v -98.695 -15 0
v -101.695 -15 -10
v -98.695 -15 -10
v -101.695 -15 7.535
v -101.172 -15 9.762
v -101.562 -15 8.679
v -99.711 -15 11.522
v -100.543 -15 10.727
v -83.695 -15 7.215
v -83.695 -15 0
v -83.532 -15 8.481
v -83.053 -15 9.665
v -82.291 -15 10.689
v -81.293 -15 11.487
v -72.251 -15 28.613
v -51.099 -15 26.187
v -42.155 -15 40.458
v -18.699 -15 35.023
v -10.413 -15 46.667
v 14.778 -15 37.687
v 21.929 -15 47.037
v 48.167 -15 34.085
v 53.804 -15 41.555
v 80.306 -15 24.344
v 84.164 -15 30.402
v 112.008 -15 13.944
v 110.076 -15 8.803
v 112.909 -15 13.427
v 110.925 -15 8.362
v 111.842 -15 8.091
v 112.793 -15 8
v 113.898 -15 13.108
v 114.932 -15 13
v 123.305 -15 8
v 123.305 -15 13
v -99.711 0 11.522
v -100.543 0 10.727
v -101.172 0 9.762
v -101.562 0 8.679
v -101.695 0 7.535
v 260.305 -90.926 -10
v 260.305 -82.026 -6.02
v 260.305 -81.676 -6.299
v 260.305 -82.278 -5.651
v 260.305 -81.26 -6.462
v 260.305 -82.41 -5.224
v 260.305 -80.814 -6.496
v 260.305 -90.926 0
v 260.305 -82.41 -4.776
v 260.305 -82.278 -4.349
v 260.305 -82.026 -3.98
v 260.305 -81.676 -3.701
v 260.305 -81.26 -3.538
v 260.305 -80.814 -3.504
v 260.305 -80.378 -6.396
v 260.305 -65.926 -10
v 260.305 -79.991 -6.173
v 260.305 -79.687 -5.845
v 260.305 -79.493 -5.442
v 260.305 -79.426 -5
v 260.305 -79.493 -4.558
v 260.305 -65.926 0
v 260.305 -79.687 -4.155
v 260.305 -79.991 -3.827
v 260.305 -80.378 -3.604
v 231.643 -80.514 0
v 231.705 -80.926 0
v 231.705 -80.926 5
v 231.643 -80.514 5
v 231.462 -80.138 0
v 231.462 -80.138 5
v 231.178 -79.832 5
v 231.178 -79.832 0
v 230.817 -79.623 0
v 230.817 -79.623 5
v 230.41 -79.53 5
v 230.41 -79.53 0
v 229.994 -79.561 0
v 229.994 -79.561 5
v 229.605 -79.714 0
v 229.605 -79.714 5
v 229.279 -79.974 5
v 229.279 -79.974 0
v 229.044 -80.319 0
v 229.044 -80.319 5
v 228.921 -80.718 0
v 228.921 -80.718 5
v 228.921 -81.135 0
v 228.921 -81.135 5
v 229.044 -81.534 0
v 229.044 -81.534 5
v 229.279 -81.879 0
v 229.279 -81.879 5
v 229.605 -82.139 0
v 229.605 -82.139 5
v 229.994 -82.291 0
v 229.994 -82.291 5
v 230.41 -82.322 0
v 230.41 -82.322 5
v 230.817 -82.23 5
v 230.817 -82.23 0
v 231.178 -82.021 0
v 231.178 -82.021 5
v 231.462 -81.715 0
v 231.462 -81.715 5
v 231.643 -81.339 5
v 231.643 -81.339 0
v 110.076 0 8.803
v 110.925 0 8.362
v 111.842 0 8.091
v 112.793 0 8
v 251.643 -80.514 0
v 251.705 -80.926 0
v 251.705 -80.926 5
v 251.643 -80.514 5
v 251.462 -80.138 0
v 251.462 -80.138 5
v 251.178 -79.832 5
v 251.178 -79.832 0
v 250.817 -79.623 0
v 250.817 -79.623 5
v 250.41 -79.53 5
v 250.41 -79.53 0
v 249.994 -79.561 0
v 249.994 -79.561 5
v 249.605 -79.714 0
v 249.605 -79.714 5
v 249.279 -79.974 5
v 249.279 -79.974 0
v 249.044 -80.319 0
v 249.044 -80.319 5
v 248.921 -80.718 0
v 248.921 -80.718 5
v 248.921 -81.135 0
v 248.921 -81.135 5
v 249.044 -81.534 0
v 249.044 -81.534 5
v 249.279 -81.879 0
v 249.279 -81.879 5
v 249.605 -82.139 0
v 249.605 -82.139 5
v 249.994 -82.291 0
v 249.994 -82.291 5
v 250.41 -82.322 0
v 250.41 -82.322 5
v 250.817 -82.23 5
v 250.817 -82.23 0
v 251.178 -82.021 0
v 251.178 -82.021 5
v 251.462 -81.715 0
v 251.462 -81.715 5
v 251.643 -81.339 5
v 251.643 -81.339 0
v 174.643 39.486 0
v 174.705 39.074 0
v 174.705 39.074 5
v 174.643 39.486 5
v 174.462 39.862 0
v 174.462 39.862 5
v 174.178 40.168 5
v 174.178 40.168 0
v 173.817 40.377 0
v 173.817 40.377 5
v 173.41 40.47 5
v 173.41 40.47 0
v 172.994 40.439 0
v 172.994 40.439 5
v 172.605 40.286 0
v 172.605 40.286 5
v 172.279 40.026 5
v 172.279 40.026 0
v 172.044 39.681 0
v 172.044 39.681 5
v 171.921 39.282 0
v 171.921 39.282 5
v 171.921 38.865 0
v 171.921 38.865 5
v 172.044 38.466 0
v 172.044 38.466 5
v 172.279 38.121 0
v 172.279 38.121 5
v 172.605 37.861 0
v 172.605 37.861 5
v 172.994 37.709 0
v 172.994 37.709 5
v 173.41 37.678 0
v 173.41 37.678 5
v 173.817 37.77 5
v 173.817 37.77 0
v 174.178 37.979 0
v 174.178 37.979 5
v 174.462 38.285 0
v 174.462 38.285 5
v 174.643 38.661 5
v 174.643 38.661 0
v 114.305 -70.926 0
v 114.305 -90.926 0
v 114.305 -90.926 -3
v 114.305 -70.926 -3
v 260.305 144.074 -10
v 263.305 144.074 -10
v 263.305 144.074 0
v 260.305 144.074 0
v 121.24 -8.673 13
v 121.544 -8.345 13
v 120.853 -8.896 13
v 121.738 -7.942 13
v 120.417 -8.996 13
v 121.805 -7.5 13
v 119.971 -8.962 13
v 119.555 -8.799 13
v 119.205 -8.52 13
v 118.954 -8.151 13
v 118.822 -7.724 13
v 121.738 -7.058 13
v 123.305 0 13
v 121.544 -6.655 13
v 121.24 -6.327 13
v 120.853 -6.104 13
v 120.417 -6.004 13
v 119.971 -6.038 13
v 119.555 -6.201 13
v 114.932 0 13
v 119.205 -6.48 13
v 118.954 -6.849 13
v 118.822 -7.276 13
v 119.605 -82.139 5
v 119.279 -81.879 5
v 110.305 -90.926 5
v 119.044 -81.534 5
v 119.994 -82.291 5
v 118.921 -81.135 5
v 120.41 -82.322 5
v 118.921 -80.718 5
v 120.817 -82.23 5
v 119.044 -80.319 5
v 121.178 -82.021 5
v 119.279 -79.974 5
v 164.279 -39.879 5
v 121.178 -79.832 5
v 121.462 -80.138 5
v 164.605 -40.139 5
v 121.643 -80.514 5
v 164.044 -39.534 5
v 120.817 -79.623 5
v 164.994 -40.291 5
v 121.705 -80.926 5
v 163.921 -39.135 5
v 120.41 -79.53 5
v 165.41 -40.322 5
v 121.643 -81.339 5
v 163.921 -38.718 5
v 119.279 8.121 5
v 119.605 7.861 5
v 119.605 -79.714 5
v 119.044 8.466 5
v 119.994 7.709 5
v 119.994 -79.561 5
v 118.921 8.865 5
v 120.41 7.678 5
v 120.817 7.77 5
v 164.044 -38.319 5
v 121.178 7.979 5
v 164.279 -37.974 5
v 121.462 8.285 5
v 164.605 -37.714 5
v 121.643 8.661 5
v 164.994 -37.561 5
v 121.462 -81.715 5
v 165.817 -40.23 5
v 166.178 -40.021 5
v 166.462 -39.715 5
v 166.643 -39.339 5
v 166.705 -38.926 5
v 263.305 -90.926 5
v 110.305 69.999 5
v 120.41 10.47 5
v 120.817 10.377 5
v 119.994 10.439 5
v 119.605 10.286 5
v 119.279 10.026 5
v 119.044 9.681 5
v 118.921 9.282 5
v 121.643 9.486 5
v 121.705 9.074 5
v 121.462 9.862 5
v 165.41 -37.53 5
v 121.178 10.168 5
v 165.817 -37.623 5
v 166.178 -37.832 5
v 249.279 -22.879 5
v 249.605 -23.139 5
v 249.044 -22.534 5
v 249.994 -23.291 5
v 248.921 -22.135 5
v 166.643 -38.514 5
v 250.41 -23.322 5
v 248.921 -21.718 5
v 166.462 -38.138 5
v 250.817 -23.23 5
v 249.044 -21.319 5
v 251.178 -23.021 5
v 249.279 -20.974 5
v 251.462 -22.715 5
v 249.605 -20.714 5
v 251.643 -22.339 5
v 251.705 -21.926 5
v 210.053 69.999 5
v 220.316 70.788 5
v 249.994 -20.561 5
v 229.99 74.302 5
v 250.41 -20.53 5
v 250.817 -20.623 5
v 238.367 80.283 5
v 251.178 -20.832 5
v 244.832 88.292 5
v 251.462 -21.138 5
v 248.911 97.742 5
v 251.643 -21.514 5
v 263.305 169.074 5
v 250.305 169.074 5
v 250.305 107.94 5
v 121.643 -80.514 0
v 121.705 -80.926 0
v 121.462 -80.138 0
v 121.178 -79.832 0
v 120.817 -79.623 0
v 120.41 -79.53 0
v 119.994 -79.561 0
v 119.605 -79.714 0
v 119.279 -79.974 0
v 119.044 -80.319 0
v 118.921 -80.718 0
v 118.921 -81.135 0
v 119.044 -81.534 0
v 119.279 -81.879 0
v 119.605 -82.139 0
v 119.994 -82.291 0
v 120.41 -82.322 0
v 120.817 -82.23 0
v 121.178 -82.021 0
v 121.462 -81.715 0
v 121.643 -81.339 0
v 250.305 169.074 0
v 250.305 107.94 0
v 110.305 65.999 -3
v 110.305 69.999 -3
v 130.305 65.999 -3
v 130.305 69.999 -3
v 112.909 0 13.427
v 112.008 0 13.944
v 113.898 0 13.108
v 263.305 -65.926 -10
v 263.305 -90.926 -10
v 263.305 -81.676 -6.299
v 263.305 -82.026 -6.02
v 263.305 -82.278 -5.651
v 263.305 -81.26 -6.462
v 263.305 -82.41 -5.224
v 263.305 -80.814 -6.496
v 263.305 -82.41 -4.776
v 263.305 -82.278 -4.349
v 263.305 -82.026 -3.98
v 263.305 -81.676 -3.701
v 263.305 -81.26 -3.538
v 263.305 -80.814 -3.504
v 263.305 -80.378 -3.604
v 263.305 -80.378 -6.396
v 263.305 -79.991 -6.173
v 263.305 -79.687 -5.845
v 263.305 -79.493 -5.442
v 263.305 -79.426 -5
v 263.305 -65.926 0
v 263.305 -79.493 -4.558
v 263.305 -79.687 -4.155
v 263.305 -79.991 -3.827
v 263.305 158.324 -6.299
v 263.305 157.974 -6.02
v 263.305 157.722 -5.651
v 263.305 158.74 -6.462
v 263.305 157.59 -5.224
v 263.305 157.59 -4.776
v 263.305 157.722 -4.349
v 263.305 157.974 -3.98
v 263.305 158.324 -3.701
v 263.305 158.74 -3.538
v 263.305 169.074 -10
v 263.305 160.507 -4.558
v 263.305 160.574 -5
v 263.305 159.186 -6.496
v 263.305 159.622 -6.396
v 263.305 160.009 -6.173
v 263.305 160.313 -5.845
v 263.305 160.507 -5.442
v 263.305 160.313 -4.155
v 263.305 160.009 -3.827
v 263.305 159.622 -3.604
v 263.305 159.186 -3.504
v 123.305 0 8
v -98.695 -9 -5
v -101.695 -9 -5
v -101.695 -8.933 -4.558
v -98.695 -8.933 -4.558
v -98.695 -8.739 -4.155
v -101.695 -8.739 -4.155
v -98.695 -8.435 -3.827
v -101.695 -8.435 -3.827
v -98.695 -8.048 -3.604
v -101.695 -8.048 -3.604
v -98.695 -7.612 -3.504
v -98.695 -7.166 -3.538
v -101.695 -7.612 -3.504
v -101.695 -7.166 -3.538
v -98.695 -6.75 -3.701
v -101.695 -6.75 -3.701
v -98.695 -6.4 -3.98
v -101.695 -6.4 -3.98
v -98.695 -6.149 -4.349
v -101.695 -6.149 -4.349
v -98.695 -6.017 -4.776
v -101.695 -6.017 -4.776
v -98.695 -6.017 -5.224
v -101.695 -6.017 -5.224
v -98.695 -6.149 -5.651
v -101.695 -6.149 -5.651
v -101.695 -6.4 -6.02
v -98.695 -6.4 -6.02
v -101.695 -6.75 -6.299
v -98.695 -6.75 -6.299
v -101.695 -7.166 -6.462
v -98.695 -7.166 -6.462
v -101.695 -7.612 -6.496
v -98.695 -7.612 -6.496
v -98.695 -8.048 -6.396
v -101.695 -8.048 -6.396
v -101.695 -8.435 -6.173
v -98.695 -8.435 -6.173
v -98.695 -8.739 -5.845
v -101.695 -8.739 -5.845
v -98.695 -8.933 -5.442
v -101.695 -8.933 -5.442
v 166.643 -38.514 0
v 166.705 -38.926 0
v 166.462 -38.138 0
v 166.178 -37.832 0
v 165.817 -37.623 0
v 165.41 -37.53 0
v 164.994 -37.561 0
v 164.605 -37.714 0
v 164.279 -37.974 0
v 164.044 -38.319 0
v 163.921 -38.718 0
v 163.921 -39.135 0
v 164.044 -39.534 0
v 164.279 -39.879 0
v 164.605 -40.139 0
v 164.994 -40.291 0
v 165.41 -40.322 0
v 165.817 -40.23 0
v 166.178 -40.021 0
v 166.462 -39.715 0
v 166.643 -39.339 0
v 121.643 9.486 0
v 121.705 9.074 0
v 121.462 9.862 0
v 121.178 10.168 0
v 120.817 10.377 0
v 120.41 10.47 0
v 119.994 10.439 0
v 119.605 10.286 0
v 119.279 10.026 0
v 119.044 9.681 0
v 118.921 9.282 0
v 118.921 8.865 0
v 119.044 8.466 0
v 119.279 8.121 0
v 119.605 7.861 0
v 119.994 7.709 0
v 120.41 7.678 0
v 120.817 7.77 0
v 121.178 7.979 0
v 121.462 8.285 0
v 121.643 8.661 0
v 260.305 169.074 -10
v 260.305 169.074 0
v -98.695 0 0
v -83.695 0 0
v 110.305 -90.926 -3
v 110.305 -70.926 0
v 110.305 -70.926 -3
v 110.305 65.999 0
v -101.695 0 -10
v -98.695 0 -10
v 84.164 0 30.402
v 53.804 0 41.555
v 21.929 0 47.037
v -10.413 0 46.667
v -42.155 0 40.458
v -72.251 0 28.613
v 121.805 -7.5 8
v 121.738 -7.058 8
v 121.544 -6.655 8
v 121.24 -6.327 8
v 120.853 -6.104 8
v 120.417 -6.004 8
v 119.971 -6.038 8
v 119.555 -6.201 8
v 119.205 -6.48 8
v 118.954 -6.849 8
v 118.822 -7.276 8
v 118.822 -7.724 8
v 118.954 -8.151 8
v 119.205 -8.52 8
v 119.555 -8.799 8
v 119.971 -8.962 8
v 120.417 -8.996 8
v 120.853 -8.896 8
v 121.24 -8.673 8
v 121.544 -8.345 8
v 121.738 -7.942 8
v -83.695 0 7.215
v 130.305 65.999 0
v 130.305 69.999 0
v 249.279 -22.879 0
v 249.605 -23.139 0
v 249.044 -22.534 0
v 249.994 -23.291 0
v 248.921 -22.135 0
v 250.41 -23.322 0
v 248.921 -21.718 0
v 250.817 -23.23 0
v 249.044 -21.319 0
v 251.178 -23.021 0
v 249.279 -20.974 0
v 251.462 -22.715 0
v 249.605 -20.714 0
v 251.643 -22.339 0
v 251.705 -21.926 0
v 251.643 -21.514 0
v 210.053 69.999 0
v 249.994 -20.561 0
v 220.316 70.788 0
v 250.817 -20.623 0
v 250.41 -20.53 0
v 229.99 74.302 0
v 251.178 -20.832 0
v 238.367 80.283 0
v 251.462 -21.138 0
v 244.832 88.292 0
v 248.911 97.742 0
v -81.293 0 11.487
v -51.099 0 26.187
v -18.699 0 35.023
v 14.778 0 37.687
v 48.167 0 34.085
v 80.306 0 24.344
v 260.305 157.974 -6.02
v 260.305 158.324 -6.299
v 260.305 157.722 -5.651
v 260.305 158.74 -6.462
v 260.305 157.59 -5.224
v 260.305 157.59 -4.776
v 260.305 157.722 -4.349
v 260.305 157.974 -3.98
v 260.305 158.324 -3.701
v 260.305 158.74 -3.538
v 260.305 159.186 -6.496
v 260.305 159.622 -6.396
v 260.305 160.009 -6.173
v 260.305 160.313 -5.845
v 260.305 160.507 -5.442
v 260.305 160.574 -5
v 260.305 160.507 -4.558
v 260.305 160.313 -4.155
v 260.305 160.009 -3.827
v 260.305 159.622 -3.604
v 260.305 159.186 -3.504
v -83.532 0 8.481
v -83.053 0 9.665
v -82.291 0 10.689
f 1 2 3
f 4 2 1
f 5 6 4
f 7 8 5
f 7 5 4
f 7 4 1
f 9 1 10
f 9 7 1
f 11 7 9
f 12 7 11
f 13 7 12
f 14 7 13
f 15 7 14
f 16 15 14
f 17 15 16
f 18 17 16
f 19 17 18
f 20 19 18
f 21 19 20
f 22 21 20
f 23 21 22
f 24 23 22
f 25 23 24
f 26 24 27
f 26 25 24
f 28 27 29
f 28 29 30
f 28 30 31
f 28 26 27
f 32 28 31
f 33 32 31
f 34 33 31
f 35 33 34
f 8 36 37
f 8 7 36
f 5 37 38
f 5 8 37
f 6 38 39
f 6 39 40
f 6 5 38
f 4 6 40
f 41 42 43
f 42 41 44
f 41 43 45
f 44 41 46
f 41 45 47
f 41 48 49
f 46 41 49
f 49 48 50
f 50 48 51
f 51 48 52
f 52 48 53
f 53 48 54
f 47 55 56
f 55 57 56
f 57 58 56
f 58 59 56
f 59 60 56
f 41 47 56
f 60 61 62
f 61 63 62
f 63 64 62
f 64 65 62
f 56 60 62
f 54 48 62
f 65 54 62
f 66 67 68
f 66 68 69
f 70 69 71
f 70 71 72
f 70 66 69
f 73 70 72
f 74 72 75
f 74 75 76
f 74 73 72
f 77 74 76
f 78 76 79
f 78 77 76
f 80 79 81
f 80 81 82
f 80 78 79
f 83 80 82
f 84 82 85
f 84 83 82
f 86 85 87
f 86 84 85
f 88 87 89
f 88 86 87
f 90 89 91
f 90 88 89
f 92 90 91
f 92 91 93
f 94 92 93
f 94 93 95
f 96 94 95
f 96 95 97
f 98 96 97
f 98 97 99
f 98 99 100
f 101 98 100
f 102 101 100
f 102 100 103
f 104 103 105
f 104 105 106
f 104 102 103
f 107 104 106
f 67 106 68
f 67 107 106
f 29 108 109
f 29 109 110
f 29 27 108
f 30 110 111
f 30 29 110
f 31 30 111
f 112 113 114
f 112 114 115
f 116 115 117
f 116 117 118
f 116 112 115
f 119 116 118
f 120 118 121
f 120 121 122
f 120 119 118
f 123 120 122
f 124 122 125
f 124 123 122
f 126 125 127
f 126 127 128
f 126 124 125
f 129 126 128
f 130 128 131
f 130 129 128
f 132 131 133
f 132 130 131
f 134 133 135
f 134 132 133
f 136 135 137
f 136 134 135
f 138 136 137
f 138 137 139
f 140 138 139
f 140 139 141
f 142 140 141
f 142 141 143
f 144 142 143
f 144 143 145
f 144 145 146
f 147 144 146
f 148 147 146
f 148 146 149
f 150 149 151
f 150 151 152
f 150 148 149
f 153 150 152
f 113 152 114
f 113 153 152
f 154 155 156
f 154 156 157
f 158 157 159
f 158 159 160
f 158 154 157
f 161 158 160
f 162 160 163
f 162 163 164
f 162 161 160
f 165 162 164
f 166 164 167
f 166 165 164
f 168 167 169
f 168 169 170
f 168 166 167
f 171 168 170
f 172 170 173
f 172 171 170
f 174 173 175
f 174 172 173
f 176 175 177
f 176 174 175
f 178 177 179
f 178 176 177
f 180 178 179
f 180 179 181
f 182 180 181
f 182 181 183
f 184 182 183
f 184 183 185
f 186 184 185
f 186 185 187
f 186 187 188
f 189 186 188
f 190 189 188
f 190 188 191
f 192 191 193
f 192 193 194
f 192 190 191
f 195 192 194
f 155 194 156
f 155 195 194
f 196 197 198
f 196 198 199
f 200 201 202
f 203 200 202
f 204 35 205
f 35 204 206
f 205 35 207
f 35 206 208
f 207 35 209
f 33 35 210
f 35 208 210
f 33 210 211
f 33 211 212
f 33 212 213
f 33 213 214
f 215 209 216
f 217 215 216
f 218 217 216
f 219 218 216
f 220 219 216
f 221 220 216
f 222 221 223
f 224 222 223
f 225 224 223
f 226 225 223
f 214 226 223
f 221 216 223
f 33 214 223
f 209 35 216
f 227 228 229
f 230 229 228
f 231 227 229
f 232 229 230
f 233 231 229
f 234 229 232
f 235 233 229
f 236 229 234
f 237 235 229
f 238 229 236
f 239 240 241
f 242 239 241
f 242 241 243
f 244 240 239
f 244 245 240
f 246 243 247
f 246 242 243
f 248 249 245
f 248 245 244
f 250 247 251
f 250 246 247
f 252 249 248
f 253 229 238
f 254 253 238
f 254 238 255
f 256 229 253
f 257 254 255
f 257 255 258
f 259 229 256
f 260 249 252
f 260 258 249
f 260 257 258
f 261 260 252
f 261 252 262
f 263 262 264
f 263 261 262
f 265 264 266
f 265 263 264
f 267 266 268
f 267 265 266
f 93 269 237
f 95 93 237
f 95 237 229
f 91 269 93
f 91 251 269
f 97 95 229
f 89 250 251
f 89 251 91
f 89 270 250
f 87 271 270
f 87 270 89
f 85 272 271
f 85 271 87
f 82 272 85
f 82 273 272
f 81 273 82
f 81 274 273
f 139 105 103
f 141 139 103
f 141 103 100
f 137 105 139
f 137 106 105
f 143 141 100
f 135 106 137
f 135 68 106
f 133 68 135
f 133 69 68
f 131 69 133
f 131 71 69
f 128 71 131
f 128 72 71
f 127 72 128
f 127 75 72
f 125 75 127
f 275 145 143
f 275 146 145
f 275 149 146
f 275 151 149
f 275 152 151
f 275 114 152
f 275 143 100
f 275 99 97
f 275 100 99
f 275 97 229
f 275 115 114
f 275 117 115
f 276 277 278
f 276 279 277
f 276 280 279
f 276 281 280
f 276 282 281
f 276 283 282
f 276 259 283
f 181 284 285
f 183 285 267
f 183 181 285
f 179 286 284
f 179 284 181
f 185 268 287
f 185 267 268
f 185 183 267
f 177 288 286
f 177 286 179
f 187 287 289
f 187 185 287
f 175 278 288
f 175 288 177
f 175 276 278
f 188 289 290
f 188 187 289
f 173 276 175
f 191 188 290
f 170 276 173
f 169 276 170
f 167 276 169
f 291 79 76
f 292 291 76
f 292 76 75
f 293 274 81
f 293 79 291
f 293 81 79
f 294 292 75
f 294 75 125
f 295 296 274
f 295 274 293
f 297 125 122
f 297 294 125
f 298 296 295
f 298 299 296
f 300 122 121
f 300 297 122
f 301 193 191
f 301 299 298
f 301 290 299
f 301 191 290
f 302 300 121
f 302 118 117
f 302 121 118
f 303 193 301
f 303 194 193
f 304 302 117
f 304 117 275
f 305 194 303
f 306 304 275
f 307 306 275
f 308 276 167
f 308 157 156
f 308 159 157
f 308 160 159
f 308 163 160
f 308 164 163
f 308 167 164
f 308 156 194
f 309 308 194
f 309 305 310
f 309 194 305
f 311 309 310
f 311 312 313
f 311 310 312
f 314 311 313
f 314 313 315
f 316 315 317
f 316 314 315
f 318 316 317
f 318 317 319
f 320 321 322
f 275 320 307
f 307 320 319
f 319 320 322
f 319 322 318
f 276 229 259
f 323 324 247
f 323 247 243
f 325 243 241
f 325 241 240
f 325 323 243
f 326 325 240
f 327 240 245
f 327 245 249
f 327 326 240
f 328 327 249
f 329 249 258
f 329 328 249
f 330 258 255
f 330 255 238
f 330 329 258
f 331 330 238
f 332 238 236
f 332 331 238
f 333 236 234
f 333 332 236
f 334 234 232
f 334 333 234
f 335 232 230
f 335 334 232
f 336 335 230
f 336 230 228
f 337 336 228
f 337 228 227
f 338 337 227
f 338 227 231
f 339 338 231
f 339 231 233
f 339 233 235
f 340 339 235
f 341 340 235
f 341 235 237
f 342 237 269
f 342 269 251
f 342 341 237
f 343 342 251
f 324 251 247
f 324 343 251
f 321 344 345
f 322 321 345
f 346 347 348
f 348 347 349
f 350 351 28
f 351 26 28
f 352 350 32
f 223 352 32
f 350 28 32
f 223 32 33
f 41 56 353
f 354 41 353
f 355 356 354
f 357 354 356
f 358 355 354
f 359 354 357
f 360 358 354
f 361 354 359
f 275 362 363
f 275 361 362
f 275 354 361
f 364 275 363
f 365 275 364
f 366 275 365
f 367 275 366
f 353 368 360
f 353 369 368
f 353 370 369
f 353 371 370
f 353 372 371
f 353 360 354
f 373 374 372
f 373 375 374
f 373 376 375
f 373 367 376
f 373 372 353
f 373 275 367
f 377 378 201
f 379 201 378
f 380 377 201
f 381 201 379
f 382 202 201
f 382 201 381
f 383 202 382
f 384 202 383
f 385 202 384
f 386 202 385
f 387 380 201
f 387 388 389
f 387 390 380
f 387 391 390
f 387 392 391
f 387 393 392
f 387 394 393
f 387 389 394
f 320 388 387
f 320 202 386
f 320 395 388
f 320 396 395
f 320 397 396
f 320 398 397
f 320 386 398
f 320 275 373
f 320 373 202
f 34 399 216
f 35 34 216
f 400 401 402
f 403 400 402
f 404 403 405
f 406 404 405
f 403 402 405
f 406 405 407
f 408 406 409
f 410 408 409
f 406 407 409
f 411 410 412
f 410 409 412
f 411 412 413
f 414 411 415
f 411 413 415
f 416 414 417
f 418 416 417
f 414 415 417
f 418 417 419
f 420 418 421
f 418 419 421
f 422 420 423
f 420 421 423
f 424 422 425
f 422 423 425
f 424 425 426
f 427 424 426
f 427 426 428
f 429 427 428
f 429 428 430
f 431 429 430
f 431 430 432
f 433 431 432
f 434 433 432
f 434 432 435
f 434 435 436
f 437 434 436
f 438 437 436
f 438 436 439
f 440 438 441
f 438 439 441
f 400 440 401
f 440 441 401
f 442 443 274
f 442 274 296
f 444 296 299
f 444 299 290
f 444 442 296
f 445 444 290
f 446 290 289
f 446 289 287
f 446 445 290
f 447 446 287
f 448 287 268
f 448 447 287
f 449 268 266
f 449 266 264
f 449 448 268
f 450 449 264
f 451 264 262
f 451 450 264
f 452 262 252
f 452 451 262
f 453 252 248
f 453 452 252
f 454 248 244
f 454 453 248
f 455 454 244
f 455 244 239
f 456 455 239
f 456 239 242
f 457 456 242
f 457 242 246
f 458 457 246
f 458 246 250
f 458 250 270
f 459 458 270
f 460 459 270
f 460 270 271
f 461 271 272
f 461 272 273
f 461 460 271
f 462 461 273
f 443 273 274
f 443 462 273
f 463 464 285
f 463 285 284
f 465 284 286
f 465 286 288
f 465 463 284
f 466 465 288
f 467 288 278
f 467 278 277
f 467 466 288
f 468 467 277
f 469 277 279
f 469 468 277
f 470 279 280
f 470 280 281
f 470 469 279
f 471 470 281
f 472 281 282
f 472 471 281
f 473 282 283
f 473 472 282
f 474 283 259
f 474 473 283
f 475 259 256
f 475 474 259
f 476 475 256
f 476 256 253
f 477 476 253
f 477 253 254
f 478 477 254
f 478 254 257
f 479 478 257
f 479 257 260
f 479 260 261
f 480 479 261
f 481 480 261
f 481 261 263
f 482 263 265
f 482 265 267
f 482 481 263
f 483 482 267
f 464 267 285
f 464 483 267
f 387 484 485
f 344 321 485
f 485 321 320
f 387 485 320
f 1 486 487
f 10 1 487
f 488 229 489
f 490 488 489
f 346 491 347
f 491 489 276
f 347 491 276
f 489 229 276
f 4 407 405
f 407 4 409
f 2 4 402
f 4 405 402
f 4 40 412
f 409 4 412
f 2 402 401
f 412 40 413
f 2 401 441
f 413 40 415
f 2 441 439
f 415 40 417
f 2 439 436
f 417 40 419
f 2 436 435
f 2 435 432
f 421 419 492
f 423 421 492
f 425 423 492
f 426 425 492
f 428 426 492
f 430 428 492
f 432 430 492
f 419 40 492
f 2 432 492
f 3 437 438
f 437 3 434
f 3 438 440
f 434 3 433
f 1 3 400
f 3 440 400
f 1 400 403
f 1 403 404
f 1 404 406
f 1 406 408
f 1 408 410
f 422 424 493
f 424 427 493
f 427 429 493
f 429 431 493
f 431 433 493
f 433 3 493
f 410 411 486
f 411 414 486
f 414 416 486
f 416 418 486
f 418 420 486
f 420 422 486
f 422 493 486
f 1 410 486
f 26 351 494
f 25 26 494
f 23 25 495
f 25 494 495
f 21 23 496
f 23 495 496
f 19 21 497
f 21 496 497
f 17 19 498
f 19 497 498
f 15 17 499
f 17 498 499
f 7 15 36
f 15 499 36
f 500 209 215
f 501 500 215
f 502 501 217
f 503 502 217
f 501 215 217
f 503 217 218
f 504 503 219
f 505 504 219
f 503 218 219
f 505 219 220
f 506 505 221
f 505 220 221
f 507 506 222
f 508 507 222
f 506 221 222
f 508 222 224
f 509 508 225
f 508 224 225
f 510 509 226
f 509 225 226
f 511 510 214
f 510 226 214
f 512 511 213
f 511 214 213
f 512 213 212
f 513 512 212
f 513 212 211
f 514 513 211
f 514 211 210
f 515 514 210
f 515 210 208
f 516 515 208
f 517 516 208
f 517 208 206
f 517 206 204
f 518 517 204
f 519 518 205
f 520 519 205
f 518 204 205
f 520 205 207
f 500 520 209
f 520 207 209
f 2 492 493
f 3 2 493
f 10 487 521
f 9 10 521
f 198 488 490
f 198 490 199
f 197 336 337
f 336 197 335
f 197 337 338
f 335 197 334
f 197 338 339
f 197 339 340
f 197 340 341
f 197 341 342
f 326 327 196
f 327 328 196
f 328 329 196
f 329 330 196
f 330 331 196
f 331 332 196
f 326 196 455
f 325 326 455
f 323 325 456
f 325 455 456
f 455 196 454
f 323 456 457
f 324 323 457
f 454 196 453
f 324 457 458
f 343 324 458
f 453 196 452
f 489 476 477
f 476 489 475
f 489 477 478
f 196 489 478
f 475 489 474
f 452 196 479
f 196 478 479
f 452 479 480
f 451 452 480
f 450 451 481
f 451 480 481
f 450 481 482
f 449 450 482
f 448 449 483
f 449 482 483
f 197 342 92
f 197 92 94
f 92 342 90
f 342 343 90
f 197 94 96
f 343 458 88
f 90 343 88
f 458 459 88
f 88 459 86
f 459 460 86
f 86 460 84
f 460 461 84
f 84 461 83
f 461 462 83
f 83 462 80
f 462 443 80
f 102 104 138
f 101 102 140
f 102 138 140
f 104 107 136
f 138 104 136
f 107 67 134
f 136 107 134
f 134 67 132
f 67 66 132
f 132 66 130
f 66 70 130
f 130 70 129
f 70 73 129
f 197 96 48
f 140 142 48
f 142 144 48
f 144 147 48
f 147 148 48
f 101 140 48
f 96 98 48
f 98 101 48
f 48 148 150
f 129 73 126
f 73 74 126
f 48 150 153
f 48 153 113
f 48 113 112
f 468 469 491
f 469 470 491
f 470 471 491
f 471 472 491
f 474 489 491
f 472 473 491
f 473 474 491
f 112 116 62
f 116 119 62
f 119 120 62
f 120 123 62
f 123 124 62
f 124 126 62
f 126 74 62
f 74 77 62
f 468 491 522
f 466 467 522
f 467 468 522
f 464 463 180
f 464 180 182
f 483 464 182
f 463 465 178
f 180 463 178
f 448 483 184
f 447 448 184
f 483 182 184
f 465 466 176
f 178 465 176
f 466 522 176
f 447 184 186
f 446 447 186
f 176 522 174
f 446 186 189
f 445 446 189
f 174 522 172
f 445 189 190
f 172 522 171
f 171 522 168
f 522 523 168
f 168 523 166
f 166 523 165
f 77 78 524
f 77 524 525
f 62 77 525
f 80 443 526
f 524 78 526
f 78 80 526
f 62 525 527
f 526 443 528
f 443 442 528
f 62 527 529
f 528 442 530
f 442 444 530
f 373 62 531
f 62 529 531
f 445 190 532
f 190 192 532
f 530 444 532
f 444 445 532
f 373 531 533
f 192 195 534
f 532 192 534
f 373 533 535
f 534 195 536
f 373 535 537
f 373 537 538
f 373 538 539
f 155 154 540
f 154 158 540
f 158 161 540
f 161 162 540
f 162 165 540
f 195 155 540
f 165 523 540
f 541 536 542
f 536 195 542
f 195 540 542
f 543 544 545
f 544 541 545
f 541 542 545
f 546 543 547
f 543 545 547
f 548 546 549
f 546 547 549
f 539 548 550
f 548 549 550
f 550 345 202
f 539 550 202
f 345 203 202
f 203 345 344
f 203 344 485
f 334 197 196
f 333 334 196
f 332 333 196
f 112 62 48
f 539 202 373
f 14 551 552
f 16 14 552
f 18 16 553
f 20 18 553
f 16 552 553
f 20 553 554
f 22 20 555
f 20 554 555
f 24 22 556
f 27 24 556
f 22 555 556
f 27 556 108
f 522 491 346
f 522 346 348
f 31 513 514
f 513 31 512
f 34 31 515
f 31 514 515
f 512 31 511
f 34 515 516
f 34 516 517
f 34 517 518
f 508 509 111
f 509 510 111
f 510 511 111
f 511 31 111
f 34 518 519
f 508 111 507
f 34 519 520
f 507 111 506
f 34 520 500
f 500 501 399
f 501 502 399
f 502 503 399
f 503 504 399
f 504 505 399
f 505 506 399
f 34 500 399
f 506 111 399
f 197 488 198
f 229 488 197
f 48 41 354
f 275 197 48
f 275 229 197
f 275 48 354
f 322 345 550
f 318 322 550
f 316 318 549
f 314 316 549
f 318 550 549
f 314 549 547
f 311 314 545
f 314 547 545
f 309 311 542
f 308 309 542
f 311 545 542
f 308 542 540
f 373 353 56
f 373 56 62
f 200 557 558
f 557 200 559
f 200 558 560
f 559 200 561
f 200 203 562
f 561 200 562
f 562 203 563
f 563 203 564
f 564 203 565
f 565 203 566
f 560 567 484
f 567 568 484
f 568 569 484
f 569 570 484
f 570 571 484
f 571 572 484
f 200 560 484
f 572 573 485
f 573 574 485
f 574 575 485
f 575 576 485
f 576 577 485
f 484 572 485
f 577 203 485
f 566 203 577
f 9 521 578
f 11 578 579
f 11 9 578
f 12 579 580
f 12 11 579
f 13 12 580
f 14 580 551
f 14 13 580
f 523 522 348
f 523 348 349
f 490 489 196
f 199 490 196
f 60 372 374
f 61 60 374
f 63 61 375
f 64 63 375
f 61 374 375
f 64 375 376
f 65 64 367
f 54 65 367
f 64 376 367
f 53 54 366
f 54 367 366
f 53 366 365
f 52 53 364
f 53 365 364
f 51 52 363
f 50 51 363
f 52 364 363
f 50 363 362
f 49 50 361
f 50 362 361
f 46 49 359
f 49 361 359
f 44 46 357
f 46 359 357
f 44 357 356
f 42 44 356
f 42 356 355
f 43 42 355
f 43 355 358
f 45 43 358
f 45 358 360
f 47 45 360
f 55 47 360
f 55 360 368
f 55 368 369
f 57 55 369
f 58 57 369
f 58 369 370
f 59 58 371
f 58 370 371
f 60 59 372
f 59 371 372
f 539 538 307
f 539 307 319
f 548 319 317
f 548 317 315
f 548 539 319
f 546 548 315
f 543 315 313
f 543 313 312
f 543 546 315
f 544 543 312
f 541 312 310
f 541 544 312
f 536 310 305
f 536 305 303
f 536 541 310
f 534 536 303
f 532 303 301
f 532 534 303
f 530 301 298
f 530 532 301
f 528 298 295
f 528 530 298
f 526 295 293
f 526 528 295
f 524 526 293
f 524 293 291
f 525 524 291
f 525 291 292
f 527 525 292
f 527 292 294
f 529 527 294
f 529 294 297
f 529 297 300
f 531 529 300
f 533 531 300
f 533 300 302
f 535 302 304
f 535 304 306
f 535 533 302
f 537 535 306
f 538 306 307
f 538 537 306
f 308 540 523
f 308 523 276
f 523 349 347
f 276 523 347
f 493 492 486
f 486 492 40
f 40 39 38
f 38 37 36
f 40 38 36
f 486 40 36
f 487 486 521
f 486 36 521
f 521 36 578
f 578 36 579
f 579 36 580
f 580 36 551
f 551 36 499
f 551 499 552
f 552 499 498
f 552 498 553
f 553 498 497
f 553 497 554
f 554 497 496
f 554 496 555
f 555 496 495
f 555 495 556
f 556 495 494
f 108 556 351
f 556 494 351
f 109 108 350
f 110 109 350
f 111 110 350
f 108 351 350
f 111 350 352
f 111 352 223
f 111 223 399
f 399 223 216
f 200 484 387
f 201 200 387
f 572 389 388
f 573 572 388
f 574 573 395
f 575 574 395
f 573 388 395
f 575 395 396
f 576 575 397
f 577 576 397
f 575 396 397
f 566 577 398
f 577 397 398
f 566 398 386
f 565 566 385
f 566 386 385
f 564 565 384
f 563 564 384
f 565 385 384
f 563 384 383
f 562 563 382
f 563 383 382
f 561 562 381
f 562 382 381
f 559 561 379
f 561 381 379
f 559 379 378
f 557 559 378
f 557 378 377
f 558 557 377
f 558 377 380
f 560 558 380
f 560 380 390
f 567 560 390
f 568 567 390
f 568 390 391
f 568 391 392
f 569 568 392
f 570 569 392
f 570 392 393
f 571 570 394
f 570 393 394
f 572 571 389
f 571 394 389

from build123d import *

# Parameters (mm, degrees)
F0_R      = 1.4
F1_DEPTH  = 5
F2_W      = 3
F2_H      = 260
F2_W_2    = 4
F2_H_2    = 20
F2_W_3    = 20
F2_H_3    = 4
F3_DEPTH  = 5
F4_DEPTH  = 10
F5_R      = 1.5
F5_W      = 210
F5_H      = 10
F6_DEPTH  = 3
F7_DEPTH  = 3
F9_DEPTH  = 15
F10_R     = 1.5
F11_DEPTH = 3
F12_R     = 1.5
F13_DEPTH = 5
F14_R     = 5


with BuildPart() as f1:
    # F0 (on Top) → F1 (new body)
    with BuildSketch(Plane.XY):
        with BuildLine():
            Line((260.305044, -90.926297), (260.305044, 169.073703))
            Line((260.305044, 169.073703), (250.305044, 169.073703))
            Line((250.305044, 169.073703), (250.305044, 107.939899))
            ThreePointArc((250.305044, 107.939899), (238.367347, 80.282512), (210.053265, 69.99891))
            Line((210.053265, 69.99891), (110.305044, 69.99891))
            Line((110.305044, 69.99891), (110.305044, -90.926297))
            Line((110.305044, -90.926297), (260.305044, -90.926297))
        make_face()
        with Locations((120.305044, -80.926297)):
            Circle(F0_R, mode=Mode.SUBTRACT)
        with Locations((165.305044, -38.926297)):
            Circle(F0_R, mode=Mode.SUBTRACT)
        with Locations((120.305044, 9.073703)):
            Circle(F0_R, mode=Mode.SUBTRACT)
        with Locations((173.305044, 39.073703)):
            Circle(F0_R, mode=Mode.SUBTRACT)
        with Locations((230.305044, -80.926297)):
            Circle(F0_R, mode=Mode.SUBTRACT)
        with Locations((250.305044, -80.926297)):
            Circle(F0_R, mode=Mode.SUBTRACT)
        with Locations((250.305044, -21.926297)):
            Circle(F0_R, mode=Mode.SUBTRACT)
    extrude(amount=F1_DEPTH)

    # F2 (on Top) → F3 (join)
    with BuildSketch(Plane.XY):
        with Locations((261.805044, 39.073703)):
            Rectangle(F2_W, F2_H)
        with Locations((112.305044, -80.926297)):
            Rectangle(F2_W_2, F2_H_2)
        with Locations((120.305044, 67.99891)):
            Rectangle(F2_W_3, F2_H_3)
    extrude(amount=F3_DEPTH)

    # F2 (on Top) → F4 (join)
    with BuildSketch(Plane.XY):
        with Locations((261.805044, 39.073703)):
            Rectangle(F2_W, F2_H)
    extrude(amount=-F4_DEPTH)

    # F5 (on face) → F6 (cut)
    with BuildSketch(Plane.YZ.offset(263.305044)):
        with Locations((-80.926297, -5)):
            Circle(F5_R)
        with Locations((159.073703, -5)):
            Circle(F5_R)
        with Locations((39.073703, -5)):
            Rectangle(F5_W, F5_H)
    extrude(amount=-F6_DEPTH, mode=Mode.SUBTRACT)

    # F2 (on Top) → F7 (join)
    with BuildSketch(Plane.XY):
        with Locations((112.305044, -80.926297)):
            Rectangle(F2_W_2, F2_H_2)
        with Locations((120.305044, 67.99891)):
            Rectangle(F2_W_3, F2_H_3)
    extrude(amount=-F7_DEPTH)


with BuildPart() as f9:
    # F8 (on Front) → F9 (new body)
    with BuildSketch(Plane.XZ):
        with BuildLine():
            ThreePointArc((113.305044, 13), (5.301575, 47.581895), (-101.694956, 10))
            Line((-101.694956, 10), (-101.694956, -10))
            Line((-101.694956, -10), (-98.694956, -10))
            Line((-98.694956, -10), (-98.694956, 0))
            Line((-98.694956, 0), (-83.694956, 0))
            Line((-83.694956, 0), (-83.694956, 10))
            ThreePointArc((-83.694956, 10), (14.099351, 37.694988), (111.305044, 8))
            Line((111.305044, 8), (123.305044, 8))
            Line((123.305044, 8), (123.305044, 13))
            Line((123.305044, 13), (113.305044, 13))
        make_face()
    extrude(amount=F9_DEPTH)

    # F10 (on face) → F11 (cut)
    with BuildSketch(Plane(origin=(-101.694956, 0, 0), x_dir=(0, -1, 0), z_dir=(-1, 0, 0))):
        with Locations((7.5, -5)):
            Circle(F10_R)
    extrude(amount=-F11_DEPTH, mode=Mode.SUBTRACT)

    # F12 (on face) → F13 (cut)
    with BuildSketch(Plane.XY.offset(13)):
        with Locations((120.305044, -7.5)):
            Circle(F12_R)
    extrude(amount=-F13_DEPTH, mode=Mode.SUBTRACT)

    # F14
    f14_edges = [f9.edges().sort_by_distance(p)[0] for p in [
        (-83.694956, -7.5, 10),
        (113.305044, -7.5, 13),
        (111.305044, -7.5, 8),
        (-101.694956, -7.5, 10),
    ]]
    fillet(f14_edges, radius=F14_R)


solid = Compound([f1.part, f9.part])
